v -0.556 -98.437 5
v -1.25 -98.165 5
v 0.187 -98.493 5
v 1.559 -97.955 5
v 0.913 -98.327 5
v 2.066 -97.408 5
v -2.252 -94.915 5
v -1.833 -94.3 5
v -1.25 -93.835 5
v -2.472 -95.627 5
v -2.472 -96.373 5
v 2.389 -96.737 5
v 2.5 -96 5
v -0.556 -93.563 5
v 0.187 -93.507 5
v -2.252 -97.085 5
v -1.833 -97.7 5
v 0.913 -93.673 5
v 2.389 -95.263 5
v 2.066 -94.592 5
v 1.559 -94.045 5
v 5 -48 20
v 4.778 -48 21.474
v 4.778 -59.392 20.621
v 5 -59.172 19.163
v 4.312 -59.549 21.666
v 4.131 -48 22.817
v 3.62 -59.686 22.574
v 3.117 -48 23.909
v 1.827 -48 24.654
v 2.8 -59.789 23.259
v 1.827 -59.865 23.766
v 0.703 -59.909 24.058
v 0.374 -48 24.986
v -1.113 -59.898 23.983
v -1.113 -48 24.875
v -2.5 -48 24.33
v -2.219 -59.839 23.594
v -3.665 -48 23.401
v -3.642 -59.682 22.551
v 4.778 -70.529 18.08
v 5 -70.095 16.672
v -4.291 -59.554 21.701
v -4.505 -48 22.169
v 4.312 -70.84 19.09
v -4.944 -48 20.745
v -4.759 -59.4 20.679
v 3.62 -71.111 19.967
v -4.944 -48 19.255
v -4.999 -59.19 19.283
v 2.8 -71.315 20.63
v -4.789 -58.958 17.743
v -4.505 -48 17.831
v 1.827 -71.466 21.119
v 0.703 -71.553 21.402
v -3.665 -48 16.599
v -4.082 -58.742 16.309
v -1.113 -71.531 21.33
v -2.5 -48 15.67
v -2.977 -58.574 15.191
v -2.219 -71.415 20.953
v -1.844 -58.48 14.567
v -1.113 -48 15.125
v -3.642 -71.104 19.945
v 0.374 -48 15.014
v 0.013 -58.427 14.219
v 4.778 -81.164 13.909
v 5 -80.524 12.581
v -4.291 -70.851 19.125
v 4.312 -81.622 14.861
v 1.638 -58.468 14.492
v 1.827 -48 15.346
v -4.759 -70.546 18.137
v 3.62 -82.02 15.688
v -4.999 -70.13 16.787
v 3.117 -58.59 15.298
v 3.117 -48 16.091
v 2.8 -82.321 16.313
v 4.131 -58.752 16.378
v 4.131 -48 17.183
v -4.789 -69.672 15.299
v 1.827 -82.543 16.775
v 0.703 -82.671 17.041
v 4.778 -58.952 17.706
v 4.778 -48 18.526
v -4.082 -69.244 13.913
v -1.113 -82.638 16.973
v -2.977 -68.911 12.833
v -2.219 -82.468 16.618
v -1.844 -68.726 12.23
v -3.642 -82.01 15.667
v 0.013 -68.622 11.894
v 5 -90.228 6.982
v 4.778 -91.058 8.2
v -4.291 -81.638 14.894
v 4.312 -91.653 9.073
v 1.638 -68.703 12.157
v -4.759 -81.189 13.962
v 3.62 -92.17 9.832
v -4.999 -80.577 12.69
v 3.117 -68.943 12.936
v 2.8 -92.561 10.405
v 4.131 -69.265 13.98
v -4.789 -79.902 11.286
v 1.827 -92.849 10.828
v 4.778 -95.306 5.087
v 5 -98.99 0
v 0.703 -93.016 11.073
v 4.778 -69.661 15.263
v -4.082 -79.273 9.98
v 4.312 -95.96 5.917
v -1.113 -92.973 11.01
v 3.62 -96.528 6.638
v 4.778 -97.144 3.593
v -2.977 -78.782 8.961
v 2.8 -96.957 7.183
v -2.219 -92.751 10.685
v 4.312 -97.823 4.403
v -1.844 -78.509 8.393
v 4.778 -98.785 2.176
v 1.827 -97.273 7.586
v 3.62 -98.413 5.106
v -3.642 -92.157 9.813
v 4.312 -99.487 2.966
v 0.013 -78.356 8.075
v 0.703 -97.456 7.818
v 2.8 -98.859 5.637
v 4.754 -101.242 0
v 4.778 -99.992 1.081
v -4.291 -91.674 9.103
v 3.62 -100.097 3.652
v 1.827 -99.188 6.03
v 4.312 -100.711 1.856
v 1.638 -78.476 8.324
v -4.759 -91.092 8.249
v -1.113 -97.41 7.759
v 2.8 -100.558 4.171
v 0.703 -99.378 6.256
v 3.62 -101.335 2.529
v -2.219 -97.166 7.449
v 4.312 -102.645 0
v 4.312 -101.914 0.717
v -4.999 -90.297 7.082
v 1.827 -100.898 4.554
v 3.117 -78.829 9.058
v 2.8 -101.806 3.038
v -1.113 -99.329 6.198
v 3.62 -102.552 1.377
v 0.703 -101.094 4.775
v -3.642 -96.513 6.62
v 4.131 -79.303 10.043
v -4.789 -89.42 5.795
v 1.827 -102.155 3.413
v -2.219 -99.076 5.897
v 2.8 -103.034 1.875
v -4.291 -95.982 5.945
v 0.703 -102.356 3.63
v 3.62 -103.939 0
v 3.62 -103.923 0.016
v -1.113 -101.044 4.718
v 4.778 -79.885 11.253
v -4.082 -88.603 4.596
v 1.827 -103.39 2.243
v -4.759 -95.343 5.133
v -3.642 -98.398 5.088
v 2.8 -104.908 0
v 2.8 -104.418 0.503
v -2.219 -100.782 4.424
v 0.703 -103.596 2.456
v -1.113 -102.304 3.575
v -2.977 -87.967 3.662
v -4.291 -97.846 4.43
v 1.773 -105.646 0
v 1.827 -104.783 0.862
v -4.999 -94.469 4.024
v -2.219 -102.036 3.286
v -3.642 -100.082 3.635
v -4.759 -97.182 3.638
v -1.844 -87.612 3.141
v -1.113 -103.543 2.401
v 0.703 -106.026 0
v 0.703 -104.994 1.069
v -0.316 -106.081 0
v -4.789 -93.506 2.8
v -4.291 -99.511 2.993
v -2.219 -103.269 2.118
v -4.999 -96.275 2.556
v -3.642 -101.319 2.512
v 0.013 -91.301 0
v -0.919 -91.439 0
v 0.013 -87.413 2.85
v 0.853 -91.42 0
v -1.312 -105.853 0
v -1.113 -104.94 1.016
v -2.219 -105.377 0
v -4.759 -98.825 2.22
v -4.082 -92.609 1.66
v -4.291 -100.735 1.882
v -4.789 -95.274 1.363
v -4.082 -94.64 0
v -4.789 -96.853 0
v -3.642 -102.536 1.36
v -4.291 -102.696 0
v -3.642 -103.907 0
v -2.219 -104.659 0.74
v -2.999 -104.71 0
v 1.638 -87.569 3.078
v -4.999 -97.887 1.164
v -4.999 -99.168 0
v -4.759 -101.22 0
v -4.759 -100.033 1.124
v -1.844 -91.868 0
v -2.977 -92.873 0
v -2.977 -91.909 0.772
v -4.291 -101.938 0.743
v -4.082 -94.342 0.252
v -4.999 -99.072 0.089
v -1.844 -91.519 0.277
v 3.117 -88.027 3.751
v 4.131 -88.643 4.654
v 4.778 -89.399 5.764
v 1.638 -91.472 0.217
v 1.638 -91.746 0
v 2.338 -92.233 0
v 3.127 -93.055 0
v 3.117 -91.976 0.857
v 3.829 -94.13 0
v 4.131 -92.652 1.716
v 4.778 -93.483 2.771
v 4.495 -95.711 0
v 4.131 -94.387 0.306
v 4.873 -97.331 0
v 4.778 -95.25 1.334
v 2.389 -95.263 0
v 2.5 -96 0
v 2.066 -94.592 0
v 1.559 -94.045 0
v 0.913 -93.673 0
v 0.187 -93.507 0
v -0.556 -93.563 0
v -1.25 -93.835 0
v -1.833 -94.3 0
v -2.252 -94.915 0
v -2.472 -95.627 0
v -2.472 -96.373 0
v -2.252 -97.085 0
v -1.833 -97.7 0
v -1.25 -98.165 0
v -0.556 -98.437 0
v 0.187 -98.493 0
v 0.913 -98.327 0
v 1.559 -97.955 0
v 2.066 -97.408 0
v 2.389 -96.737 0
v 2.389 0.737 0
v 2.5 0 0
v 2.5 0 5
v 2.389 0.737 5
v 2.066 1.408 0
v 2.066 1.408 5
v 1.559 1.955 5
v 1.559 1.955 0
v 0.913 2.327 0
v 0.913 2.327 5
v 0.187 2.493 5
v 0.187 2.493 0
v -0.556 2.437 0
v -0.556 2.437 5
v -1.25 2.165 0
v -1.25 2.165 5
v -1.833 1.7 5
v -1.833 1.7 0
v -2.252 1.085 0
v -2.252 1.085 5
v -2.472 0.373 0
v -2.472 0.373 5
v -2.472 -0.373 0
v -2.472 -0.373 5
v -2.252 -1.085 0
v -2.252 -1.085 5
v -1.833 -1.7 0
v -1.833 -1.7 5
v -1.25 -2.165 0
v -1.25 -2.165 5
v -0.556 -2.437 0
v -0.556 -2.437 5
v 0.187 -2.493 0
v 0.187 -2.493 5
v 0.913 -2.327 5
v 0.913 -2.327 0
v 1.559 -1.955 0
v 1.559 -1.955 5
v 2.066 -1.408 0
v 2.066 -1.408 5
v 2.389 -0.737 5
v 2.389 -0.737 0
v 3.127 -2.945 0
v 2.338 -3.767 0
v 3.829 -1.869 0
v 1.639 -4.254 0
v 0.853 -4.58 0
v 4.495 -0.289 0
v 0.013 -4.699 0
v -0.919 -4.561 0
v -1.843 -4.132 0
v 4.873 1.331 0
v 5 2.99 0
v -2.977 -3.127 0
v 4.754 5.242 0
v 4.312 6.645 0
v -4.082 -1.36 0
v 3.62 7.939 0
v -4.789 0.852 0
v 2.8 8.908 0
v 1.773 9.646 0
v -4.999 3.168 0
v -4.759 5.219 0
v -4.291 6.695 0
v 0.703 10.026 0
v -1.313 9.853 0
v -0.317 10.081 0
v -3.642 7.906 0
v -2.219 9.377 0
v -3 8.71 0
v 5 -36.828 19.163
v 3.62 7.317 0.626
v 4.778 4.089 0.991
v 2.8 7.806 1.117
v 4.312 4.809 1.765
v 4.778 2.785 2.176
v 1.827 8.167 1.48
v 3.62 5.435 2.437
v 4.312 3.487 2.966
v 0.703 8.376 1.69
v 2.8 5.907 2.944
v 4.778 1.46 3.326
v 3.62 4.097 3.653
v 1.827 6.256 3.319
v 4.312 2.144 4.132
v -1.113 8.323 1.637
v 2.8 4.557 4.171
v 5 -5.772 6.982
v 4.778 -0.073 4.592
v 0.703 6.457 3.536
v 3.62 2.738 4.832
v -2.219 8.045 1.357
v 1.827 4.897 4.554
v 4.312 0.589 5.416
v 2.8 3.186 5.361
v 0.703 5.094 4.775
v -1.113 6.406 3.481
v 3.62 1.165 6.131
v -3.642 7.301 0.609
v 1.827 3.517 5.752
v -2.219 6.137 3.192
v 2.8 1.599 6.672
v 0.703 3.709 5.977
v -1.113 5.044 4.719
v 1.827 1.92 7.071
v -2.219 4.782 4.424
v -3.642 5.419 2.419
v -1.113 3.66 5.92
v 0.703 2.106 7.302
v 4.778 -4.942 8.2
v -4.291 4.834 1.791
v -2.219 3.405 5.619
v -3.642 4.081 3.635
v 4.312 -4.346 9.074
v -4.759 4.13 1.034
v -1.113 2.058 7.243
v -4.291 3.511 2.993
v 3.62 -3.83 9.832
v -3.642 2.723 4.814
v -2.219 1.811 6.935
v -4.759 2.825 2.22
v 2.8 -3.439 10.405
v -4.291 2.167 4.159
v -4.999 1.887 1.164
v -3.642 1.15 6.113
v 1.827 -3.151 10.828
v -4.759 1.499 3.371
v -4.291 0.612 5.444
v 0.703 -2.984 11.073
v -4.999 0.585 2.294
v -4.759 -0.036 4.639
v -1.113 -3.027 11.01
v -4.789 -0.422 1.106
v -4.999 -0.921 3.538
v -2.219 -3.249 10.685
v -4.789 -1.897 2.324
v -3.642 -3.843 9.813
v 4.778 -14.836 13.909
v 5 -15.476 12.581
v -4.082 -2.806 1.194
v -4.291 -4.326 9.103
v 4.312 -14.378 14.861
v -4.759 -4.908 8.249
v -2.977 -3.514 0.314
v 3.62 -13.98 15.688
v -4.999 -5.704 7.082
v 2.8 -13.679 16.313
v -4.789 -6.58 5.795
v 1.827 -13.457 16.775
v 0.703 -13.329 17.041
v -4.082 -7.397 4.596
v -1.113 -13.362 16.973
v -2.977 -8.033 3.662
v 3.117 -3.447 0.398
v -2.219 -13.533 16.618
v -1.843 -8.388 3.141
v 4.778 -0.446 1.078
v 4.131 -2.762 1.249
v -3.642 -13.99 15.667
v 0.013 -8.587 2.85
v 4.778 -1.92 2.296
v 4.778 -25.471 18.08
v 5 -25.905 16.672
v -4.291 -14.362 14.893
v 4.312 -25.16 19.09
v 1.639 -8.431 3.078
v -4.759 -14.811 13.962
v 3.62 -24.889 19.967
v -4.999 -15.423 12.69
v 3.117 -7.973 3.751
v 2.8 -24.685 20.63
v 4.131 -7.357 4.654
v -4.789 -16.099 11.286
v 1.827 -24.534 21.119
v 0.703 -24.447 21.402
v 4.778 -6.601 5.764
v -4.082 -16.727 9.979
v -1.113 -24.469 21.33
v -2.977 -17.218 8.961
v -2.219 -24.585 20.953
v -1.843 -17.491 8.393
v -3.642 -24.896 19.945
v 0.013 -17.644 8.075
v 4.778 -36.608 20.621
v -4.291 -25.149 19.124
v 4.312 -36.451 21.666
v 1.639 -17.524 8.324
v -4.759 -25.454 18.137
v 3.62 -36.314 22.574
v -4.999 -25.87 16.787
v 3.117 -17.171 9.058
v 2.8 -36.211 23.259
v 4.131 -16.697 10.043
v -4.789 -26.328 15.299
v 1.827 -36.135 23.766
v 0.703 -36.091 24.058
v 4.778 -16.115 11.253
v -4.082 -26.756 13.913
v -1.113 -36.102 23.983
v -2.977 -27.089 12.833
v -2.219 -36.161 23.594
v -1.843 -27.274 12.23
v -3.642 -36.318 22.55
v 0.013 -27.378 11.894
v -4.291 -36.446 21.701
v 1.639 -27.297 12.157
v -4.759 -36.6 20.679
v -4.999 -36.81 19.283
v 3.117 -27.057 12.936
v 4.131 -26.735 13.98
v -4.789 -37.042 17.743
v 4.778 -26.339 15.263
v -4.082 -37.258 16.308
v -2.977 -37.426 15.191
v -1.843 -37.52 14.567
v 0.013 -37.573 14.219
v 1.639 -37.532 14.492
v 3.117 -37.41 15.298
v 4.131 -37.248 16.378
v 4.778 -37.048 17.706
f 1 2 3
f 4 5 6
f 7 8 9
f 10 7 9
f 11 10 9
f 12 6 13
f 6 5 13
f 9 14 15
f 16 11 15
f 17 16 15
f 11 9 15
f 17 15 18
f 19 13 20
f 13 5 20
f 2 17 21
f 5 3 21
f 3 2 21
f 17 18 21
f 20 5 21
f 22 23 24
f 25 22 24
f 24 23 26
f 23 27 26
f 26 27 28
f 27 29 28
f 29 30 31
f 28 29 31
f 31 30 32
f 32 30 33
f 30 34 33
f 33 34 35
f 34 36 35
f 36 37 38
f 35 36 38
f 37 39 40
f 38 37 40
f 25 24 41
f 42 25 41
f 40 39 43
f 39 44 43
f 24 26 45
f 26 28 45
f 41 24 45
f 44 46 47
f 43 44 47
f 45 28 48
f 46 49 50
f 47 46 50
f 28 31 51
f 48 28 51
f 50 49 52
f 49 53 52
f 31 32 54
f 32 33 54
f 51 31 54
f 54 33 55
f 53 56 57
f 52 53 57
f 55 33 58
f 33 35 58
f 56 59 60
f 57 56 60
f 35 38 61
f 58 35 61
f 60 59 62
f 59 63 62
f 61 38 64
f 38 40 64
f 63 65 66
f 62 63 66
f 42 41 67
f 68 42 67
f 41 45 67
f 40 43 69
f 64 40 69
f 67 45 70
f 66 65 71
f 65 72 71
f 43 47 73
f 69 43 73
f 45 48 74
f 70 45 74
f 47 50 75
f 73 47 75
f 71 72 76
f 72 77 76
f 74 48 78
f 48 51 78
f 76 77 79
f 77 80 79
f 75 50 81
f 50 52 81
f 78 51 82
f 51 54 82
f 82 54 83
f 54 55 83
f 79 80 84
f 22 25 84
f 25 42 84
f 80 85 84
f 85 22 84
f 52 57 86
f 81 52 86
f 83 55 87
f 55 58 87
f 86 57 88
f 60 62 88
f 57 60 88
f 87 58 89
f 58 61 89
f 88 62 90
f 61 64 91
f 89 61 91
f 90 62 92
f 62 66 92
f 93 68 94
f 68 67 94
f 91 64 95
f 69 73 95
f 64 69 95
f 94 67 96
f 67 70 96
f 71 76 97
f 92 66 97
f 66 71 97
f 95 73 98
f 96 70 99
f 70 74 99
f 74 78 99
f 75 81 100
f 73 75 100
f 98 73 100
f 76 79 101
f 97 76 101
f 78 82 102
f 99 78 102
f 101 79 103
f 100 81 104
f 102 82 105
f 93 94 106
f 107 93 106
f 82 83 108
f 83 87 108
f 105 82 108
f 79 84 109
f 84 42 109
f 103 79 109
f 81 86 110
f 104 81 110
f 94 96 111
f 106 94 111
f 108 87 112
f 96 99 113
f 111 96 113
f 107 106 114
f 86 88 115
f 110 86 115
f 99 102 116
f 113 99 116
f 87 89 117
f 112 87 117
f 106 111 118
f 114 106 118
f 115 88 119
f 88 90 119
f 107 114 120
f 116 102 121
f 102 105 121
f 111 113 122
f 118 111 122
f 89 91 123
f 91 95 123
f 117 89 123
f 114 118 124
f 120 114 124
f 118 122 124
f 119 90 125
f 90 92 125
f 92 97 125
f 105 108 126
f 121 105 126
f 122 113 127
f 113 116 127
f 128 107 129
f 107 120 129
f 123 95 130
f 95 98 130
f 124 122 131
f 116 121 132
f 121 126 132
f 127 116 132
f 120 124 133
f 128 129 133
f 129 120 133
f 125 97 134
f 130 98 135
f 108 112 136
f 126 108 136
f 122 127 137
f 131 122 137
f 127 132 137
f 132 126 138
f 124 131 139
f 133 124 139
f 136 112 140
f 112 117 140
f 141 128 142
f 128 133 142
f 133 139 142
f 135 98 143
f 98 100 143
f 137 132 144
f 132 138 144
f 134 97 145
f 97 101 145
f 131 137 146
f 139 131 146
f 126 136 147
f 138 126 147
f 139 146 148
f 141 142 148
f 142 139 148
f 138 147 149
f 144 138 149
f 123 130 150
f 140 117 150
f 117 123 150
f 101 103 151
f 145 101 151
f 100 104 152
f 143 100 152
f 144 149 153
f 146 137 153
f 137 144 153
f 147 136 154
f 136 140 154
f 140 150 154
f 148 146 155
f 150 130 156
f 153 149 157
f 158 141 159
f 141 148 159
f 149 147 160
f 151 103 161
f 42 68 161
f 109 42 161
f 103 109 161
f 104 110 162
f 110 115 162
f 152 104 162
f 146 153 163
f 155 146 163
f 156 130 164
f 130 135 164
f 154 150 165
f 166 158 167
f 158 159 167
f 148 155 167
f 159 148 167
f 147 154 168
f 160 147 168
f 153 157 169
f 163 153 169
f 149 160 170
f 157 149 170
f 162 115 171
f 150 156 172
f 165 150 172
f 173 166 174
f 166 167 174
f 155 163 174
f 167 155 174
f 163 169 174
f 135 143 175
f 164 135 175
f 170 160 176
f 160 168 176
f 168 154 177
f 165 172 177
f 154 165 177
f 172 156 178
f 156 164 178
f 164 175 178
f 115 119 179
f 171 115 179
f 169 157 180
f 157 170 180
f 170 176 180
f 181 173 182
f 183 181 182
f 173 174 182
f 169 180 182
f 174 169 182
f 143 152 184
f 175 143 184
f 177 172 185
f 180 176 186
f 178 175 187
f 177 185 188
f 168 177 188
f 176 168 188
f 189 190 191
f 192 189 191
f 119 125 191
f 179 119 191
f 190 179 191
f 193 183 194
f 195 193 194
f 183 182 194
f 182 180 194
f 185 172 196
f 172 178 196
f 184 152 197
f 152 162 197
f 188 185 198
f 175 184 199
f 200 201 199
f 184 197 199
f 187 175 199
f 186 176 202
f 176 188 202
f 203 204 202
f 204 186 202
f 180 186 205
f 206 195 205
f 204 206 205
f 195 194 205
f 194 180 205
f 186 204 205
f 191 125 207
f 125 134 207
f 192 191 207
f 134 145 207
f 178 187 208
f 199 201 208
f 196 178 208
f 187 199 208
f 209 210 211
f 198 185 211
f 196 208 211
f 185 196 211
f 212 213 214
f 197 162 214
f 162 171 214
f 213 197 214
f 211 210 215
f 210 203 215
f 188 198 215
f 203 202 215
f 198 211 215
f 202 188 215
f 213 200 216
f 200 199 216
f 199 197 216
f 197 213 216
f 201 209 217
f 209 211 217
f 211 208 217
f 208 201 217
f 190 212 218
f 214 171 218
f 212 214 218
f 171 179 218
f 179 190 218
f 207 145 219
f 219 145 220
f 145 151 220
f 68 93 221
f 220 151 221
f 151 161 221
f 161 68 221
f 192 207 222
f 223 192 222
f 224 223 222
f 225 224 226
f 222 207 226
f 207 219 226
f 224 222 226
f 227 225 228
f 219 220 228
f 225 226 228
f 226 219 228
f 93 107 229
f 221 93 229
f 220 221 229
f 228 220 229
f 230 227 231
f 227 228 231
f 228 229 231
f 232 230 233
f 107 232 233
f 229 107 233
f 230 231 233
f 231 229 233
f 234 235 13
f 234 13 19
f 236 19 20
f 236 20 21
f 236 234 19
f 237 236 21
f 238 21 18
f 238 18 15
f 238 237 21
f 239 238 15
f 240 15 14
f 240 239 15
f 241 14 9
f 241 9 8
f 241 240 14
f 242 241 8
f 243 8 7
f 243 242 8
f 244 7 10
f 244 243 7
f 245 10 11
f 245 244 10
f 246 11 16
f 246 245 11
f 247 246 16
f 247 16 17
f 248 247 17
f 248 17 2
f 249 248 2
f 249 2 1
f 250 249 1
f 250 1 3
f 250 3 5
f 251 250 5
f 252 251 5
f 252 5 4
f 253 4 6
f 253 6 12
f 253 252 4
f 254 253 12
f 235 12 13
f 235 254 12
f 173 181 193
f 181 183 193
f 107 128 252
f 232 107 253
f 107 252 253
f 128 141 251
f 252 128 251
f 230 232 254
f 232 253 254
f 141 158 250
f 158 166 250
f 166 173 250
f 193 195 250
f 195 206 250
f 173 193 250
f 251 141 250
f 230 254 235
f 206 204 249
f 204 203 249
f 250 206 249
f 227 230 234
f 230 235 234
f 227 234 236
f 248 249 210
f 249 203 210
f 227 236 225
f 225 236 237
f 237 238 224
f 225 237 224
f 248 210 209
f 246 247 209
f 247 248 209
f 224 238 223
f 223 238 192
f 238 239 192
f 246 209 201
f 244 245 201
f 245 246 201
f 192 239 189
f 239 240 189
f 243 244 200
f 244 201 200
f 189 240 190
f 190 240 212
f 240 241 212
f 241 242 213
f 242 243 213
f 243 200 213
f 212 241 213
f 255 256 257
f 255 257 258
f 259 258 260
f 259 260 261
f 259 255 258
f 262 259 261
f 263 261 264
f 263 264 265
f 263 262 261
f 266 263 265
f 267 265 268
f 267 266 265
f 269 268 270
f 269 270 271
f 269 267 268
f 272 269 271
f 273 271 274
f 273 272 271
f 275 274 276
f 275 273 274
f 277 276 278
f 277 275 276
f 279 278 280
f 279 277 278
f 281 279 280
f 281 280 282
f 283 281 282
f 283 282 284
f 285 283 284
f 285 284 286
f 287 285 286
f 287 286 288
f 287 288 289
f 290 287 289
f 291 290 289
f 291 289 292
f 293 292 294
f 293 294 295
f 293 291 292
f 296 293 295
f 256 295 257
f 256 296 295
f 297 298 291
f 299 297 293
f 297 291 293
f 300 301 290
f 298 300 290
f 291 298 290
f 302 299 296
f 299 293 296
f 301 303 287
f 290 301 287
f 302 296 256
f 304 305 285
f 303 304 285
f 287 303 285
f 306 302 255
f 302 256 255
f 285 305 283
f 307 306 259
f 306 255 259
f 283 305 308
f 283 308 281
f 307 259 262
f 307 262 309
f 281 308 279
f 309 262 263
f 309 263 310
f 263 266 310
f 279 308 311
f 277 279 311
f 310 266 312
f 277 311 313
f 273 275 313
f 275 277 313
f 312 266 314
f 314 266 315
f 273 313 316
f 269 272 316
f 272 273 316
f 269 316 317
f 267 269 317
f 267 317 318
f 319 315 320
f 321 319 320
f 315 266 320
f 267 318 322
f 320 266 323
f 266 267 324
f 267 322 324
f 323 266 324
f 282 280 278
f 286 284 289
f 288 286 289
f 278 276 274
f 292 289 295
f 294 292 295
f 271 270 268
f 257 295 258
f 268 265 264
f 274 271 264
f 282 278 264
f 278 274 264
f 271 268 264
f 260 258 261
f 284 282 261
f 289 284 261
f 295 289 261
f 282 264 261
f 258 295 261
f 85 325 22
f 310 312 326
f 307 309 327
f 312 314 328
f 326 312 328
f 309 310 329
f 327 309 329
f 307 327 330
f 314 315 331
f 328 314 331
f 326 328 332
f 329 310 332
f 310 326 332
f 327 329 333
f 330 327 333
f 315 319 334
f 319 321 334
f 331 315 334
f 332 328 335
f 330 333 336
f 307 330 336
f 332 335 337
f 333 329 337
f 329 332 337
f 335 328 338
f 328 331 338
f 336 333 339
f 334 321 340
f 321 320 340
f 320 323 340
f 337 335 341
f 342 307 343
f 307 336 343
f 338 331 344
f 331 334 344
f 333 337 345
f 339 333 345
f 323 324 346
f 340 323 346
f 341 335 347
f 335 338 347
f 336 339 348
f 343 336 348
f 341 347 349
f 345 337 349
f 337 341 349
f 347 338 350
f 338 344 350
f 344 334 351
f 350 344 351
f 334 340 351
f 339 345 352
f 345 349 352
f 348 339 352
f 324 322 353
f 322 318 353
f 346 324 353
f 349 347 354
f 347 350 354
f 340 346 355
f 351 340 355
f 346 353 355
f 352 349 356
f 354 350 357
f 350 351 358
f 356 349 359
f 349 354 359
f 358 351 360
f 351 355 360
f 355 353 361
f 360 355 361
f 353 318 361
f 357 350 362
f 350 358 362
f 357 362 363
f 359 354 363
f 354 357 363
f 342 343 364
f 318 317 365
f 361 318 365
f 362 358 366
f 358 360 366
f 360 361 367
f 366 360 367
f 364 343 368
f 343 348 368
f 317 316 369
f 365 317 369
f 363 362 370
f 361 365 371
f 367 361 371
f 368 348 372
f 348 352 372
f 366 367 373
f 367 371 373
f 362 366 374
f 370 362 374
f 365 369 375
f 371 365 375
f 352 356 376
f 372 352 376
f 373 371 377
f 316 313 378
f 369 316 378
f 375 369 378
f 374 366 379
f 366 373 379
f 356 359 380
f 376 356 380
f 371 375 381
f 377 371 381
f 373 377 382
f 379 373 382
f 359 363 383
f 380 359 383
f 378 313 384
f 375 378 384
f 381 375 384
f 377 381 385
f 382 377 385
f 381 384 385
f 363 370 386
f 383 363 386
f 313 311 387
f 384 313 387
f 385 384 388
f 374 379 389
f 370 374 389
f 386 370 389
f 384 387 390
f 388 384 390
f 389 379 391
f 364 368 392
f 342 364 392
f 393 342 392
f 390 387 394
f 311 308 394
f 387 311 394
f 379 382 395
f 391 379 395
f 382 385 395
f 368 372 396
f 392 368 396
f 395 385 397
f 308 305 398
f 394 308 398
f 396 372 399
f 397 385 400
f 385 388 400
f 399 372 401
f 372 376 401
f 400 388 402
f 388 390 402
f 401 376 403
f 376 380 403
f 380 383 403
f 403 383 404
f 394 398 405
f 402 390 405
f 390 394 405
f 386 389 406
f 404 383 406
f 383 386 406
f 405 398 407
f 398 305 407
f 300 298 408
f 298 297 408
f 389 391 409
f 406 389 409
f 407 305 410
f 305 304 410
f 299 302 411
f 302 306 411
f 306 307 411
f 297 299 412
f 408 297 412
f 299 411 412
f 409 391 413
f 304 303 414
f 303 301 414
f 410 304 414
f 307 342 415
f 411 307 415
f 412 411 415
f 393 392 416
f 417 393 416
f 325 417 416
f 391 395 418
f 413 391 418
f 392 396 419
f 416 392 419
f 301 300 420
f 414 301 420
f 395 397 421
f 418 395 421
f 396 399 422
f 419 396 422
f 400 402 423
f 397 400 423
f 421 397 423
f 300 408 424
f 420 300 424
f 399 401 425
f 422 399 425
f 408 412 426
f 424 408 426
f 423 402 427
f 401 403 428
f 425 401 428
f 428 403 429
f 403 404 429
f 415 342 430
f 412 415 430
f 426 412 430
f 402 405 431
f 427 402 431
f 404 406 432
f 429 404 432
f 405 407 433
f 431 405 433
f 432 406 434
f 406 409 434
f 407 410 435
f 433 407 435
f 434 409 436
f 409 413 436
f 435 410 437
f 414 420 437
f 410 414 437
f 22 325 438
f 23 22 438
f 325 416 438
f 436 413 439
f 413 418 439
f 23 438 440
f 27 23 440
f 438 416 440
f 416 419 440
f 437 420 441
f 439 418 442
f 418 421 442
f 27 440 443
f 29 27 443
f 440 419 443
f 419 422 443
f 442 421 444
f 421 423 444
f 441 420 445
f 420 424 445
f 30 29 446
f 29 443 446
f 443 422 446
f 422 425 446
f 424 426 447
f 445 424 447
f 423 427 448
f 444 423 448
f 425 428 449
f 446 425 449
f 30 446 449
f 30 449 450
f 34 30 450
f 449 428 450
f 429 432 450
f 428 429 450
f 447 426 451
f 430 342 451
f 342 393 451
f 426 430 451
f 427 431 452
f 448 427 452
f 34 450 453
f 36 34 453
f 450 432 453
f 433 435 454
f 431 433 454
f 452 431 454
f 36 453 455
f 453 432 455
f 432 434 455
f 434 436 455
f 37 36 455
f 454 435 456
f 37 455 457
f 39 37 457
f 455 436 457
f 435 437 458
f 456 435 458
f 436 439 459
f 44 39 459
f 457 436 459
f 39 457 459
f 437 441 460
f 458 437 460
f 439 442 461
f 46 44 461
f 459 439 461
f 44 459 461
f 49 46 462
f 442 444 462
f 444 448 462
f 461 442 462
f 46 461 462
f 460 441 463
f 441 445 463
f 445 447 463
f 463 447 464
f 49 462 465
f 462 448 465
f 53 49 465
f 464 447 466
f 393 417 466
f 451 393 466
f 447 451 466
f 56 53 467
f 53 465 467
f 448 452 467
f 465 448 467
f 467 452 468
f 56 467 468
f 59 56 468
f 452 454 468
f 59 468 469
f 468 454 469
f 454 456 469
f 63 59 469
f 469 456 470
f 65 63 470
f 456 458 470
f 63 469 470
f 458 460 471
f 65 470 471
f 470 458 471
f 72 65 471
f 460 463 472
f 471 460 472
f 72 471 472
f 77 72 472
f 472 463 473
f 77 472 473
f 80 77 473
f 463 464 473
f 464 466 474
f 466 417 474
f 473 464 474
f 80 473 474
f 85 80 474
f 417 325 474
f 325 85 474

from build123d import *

# Parameters (mm, degrees)
SKETCH1_R               = 5
CUT_EXTRUDE1_DEPTH      = 187.102122647
CUT_EXTRUDE1_DEPTH_BACK = 187.102122647
SKETCH2_W               = 140
SKETCH2_H               = 170
SKETCH4_R               = 2.5
CUT_EXTRUDE2_DEPTH      = 5


with BuildPart() as part:
    # Sketch1 → Revolve1 (revolve)
    with BuildSketch(Plane.XZ.offset(48)):
        with Locations((0, 20)):
            Circle(SKETCH1_R)
    revolve(axis=Axis((-43.255842548, -48, -55), (1, 0, 0)))

    # Sketch2 → Cut-Extrude1 (cut, two sides: drawn at the far end of the back side and taken through both)
    with BuildSketch(Plane(origin=(0, 0, 0), x_dir=(0, 0, -1), z_dir=(1, 0, 0)).offset(-CUT_EXTRUDE1_DEPTH_BACK)):
        with Locations((70, -50)):
            Rectangle(SKETCH2_W, SKETCH2_H)
    extrude(amount=CUT_EXTRUDE1_DEPTH + CUT_EXTRUDE1_DEPTH_BACK, mode=Mode.SUBTRACT)

    # Sketch4 → Cut-Extrude2 (cut)
    with BuildSketch(Plane.XY):
        Circle(SKETCH4_R)
        with Locations((0, -96)):
            Circle(SKETCH4_R)
    extrude(amount=CUT_EXTRUDE2_DEPTH, mode=Mode.SUBTRACT)


solid = part.part
